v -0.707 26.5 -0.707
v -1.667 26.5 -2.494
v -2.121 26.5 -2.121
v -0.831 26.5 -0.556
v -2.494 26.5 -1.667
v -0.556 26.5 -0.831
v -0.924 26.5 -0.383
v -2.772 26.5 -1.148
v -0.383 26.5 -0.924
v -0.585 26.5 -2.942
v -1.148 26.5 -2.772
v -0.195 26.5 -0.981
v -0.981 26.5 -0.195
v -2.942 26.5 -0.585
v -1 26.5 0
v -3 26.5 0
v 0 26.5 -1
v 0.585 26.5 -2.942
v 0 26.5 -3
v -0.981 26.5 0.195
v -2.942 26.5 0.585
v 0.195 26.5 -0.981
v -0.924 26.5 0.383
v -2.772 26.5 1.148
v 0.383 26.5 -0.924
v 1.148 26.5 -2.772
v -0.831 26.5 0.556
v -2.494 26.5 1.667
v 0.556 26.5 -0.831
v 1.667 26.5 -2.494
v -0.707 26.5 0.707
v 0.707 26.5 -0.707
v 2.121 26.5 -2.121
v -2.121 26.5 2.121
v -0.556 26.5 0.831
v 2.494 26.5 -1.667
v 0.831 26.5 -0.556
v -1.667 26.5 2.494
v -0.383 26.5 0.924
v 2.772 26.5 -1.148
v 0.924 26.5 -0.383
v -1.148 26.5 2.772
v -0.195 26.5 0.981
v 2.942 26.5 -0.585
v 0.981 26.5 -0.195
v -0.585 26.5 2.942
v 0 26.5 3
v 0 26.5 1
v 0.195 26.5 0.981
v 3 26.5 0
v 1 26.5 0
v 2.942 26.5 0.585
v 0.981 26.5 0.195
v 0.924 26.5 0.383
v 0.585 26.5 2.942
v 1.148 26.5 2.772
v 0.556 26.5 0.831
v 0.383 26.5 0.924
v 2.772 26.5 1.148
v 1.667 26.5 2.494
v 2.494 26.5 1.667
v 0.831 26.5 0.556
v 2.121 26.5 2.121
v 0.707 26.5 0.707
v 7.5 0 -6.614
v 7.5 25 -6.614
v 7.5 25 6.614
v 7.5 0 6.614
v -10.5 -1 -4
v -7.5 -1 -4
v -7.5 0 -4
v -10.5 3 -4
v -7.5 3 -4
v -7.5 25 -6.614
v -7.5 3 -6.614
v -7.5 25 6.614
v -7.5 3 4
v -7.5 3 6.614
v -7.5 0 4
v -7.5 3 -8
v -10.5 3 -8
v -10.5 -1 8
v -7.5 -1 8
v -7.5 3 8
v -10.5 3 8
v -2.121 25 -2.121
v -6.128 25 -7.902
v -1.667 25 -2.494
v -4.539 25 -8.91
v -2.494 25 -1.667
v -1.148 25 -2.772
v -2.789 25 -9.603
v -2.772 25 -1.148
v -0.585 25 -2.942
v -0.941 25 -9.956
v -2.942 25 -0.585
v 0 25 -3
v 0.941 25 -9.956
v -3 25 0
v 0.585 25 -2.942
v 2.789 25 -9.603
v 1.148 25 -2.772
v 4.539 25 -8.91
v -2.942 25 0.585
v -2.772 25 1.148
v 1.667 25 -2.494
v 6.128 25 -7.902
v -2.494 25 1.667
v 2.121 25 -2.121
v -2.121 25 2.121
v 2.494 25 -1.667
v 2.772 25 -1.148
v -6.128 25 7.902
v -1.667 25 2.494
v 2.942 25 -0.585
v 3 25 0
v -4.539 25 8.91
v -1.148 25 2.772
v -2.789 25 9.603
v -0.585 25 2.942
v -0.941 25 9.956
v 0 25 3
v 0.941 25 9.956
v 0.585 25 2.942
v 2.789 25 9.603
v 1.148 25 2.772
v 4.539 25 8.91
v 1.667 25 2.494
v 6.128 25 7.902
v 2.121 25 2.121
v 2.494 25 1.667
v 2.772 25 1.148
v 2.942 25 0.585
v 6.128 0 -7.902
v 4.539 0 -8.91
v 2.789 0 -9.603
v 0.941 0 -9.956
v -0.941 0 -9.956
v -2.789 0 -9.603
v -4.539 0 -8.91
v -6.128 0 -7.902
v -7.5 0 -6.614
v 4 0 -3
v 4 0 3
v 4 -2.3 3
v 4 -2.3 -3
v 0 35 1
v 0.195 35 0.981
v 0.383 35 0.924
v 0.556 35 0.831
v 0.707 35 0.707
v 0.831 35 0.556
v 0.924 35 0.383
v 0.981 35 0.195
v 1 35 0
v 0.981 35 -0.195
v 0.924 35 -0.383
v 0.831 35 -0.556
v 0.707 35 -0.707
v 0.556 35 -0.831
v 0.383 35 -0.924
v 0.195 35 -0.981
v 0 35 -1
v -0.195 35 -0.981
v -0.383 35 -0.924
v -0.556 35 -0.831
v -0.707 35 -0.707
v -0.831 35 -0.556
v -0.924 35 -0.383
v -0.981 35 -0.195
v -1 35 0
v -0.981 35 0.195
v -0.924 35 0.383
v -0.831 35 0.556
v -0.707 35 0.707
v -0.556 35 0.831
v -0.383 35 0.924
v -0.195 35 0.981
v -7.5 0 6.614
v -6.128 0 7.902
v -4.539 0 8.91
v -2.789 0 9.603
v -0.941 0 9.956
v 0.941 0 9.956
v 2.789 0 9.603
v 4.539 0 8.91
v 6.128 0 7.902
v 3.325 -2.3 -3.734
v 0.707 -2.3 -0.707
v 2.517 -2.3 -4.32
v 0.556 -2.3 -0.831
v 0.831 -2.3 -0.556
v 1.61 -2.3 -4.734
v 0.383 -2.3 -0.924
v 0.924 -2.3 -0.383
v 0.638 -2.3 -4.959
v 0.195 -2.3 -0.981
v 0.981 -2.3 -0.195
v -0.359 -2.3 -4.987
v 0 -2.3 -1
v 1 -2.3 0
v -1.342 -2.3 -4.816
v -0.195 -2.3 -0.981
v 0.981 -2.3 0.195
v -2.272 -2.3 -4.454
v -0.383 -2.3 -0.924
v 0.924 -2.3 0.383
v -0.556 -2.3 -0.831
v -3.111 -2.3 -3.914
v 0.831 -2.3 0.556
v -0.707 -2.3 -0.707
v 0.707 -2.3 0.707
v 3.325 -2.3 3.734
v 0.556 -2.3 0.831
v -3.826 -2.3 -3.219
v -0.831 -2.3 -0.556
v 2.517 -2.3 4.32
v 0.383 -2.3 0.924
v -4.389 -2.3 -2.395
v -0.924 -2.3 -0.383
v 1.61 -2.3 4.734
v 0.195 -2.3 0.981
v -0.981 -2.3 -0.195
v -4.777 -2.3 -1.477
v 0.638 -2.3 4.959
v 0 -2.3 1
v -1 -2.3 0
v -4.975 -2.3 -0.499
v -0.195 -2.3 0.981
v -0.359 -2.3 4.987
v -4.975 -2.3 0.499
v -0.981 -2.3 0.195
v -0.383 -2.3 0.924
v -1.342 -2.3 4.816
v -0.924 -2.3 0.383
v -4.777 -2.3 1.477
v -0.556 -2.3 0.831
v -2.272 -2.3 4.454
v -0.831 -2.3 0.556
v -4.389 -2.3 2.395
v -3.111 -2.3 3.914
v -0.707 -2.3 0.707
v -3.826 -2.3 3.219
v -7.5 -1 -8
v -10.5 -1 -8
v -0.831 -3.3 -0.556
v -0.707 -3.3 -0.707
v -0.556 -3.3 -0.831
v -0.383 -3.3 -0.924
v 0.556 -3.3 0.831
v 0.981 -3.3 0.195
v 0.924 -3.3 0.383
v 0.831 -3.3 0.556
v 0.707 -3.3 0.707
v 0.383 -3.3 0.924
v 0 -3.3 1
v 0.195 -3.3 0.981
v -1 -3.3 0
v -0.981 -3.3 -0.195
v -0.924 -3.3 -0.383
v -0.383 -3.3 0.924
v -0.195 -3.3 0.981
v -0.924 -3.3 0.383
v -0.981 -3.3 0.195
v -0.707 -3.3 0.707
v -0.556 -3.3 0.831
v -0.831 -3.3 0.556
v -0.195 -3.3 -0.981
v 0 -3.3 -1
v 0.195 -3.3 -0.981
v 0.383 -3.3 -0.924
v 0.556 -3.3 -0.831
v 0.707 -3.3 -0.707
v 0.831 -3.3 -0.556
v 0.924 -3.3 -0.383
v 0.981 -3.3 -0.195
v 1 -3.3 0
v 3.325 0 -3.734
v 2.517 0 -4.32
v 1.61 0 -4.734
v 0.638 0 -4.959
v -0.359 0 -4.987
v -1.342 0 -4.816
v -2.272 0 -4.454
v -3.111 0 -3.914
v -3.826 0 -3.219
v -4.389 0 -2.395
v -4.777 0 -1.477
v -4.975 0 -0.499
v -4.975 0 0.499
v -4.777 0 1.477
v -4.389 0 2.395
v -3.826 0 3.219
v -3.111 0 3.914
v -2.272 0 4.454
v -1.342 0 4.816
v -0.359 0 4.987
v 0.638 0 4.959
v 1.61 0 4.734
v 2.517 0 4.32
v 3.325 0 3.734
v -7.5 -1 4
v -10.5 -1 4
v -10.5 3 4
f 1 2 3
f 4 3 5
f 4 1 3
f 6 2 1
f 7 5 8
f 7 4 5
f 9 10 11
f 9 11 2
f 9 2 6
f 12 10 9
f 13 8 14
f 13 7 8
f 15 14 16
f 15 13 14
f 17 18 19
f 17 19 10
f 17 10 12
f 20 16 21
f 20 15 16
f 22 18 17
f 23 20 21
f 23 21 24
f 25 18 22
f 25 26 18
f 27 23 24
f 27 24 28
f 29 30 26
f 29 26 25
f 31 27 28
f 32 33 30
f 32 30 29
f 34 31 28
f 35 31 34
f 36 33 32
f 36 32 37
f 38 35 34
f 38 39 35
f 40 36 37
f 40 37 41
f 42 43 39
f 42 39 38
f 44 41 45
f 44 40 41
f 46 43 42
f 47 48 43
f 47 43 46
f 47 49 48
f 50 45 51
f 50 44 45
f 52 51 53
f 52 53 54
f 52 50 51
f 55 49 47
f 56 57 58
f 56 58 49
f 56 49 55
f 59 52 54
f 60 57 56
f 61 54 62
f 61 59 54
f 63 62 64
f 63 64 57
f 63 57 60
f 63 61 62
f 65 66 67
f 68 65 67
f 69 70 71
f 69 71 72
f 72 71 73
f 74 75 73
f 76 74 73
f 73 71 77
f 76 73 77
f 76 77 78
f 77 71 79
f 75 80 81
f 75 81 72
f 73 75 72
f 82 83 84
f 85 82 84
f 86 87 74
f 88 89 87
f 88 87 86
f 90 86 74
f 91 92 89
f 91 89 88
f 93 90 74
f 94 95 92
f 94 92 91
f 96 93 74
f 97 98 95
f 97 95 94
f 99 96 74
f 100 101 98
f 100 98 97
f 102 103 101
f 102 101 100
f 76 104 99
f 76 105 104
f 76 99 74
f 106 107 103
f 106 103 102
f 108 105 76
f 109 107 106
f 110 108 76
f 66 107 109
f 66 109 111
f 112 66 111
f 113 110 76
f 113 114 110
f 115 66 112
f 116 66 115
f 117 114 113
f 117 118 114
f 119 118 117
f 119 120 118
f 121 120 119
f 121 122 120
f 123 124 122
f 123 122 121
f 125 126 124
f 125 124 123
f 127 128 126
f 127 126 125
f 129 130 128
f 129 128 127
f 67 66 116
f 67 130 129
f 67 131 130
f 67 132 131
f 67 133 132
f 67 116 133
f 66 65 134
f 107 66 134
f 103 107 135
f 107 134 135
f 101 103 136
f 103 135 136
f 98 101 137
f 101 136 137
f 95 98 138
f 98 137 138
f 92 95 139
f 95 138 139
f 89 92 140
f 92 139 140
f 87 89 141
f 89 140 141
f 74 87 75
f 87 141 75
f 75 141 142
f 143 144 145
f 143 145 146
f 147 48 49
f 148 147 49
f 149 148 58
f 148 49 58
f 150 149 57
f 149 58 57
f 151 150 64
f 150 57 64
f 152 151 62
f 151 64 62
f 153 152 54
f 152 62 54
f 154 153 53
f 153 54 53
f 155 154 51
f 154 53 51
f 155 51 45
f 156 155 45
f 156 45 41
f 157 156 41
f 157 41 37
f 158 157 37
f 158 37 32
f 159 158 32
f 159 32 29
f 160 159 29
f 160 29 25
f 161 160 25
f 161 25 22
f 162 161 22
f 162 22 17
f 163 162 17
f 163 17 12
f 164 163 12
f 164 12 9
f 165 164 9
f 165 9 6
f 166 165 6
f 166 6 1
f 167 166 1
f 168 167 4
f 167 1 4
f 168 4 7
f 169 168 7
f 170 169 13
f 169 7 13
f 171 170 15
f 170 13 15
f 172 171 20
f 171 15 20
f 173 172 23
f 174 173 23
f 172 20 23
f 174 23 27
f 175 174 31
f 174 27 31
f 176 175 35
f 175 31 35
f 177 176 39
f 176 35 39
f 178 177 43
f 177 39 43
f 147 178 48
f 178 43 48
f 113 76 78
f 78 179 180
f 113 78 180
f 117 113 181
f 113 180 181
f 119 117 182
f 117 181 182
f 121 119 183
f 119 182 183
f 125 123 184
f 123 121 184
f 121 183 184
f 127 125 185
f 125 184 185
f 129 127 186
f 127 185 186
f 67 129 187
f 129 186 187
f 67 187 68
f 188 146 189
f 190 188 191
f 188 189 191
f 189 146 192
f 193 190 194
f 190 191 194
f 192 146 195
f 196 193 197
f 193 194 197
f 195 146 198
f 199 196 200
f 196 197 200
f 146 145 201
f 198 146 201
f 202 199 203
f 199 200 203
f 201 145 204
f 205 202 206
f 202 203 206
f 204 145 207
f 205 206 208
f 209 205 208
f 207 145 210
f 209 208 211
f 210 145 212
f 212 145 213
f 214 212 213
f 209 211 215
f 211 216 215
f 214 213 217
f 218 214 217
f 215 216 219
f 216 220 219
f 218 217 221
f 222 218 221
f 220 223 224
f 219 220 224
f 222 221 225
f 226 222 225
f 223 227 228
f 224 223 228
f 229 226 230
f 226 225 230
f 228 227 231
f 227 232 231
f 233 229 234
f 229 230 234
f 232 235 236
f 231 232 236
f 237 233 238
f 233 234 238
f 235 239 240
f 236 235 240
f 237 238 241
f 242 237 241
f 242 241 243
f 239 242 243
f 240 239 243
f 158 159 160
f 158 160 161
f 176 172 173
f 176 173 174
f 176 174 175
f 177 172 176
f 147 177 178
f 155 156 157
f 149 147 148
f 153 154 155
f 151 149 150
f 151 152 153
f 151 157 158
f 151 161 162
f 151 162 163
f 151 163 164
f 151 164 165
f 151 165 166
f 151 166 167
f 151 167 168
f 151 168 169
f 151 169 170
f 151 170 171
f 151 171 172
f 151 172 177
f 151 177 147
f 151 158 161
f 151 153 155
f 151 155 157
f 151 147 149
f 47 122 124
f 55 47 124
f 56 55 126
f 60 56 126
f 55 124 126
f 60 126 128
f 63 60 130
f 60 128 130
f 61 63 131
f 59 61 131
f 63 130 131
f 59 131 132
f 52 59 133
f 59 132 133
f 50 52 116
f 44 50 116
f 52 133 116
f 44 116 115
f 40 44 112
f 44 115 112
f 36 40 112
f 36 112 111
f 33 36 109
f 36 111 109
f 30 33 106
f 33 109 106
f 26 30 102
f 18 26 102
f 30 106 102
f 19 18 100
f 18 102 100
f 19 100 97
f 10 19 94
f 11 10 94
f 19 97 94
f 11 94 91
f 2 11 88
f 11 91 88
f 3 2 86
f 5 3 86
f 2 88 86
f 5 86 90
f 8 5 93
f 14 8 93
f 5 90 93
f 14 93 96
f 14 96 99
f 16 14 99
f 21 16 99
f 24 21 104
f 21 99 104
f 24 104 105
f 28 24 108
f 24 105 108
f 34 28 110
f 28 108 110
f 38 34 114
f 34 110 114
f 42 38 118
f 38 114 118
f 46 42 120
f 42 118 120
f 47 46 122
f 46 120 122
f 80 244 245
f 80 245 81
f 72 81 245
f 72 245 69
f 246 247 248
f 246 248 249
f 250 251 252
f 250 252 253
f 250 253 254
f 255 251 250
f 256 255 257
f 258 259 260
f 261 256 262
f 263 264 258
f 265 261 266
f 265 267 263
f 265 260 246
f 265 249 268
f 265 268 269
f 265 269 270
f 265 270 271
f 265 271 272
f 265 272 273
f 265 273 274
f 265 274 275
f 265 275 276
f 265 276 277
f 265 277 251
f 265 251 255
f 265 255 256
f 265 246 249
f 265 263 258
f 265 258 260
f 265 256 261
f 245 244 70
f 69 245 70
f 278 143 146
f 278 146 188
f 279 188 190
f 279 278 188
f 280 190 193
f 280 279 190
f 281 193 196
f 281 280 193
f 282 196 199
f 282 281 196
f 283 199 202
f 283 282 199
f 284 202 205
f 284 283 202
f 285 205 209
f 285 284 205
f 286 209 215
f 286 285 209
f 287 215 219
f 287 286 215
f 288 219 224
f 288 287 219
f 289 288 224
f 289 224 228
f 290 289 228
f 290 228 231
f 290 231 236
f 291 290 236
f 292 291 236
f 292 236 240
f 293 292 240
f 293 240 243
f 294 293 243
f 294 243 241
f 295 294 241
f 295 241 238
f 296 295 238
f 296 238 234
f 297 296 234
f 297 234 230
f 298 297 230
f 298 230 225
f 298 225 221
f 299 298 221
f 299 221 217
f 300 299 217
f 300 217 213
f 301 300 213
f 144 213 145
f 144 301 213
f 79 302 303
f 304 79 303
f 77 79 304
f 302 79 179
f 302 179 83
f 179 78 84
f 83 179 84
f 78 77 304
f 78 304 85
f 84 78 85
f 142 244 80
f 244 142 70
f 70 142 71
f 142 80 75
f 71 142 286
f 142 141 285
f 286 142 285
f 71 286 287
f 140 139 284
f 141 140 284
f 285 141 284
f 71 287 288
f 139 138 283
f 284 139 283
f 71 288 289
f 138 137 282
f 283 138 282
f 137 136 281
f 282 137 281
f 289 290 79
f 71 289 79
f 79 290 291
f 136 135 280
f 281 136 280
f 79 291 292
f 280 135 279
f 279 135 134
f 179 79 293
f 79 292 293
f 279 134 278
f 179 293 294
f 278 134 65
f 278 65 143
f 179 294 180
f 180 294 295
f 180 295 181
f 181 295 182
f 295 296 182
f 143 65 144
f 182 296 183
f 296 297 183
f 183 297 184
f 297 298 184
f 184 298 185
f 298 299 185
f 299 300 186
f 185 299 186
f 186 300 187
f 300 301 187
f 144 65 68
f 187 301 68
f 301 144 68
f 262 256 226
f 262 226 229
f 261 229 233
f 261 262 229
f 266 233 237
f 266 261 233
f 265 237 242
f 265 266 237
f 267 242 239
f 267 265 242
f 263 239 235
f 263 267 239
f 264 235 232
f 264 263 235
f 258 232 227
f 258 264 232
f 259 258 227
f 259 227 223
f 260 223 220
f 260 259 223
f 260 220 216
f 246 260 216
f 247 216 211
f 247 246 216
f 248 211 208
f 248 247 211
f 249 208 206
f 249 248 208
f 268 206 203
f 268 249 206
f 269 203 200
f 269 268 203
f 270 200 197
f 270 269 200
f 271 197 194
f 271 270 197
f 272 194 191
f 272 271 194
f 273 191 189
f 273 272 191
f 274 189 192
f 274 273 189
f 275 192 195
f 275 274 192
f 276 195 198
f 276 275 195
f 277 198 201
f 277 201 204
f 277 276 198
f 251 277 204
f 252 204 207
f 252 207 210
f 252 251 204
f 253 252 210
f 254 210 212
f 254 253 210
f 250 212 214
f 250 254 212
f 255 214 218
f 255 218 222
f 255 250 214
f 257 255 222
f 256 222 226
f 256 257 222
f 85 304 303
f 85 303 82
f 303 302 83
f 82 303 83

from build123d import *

# Parameters (mm, degrees)
SKETCH_1_R            = 10
EXTRUDE_1_DEPTH       = 25
CUT_EXTRUDE_2_1_REACH = 30.723
SKETCH_2_W            = 2.5
SKETCH_2_H            = 20
SKETCH_3_R            = 3
EXTRUDE_2_DEPTH       = 1.5
EXTRUDE_START         = -1.5
SKETCH_4_R            = 1
EXTRUDE_3_DEPTH       = 10
EXTRUDE_START_2       = -25
EXTRUDE_4_DEPTH       = 27.3
EXTRUDE_START_3       = 1
SKETCH_6_R            = 1
EXTRUDE_5_DEPTH       = 1
SKETCH_7_W            = 4
SKETCH_7_H            = 4
EXTRUDE_6_DEPTH       = 3


with BuildPart() as part:
    # 草图1 → 圆柱凸台-拉伸1 (new body)
    with BuildSketch(Plane(origin=(0, 0, 0), x_dir=(1, 0, 0), z_dir=(0, 1, 0))):
        with Locations(Location((0, 0, 0), (0, 0, 270))):
            Circle(SKETCH_1_R)
    extrude(amount=EXTRUDE_1_DEPTH)

    # 草图2 → 2边切除切除-拉伸1 (cut, up to next)
    with BuildSketch(Plane.XZ, mode=Mode.PRIVATE) as cut_extrude_2_1_sk1:
        with Locations((-8.75, 0)):
            Rectangle(SKETCH_2_W, SKETCH_2_H)
    cut_extrude_2_1_tool1 = extrude(cut_extrude_2_1_sk1.sketch, amount=-CUT_EXTRUDE_2_1_REACH, mode=Mode.PRIVATE) & part.part
    # 草图2 → 2边切除切除-拉伸1 (cut, up to next)
    with BuildSketch(Plane.XZ, mode=Mode.PRIVATE) as cut_extrude_2_1_sk2:
        with Locations((8.75, 0)):
            Rectangle(SKETCH_2_W, SKETCH_2_H)
    cut_extrude_2_1_tool2 = extrude(cut_extrude_2_1_sk2.sketch, amount=-CUT_EXTRUDE_2_1_REACH, mode=Mode.PRIVATE) & part.part
    add(cut_extrude_2_1_tool1.solids().sort_by_distance((-8.75, 0, 0))[0], mode=Mode.SUBTRACT)
    add(cut_extrude_2_1_tool2.solids().sort_by_distance((8.75, 0, 0))[0], mode=Mode.SUBTRACT)

    # 草图3 → 前转凸台-拉伸2 (add)
    with BuildSketch(Plane(origin=(0, 25, 0), x_dir=(1, 0, 0), z_dir=(0, 1, 0))):
        with Locations(Location((0, 0, 0), (0, 0, 270))):
            Circle(SKETCH_3_R)
    extrude(amount=EXTRUDE_2_DEPTH)

    # 草图4 → 前转杆凸台-拉伸3 (add)
    with BuildSketch(Plane(origin=(0, 26.5, 0), x_dir=(1, 0, 0), z_dir=(0, 1, 0)).offset(EXTRUDE_START)):
        with Locations(Location((0, 0, 0), (0, 0, 270))):
            Circle(SKETCH_4_R)
    extrude(amount=EXTRUDE_3_DEPTH)

    # 草图5 → 后转凸台-拉伸4 (add)
    with BuildSketch(Plane.XZ.offset(EXTRUDE_START_2)):
        with BuildLine():
            Line((4, 3), (4, -3))
            ThreePointArc((4, -3), (-5, 0), (4, 3))
        make_face()
    extrude(amount=EXTRUDE_4_DEPTH)

    # 草图6 → 后转杆凸台-拉伸5 (add)
    with BuildSketch(Plane.XZ.offset(2.3).offset(EXTRUDE_START_3)):
        with Locations(Location((0, 0, 0), (0, 0, 90))):
            Circle(SKETCH_6_R)
    extrude(amount=-EXTRUDE_5_DEPTH)

    # 草图7 → 引线凸台-拉伸6 (add)
    with BuildSketch(Plane.ZY.offset(7.5)):
        with Locations((-6, 1)):
            Rectangle(SKETCH_7_W, SKETCH_7_H)
        with Locations((6, 1)):
            Rectangle(SKETCH_7_W, SKETCH_7_H)
    extrude(amount=EXTRUDE_6_DEPTH)


solid = part.part
